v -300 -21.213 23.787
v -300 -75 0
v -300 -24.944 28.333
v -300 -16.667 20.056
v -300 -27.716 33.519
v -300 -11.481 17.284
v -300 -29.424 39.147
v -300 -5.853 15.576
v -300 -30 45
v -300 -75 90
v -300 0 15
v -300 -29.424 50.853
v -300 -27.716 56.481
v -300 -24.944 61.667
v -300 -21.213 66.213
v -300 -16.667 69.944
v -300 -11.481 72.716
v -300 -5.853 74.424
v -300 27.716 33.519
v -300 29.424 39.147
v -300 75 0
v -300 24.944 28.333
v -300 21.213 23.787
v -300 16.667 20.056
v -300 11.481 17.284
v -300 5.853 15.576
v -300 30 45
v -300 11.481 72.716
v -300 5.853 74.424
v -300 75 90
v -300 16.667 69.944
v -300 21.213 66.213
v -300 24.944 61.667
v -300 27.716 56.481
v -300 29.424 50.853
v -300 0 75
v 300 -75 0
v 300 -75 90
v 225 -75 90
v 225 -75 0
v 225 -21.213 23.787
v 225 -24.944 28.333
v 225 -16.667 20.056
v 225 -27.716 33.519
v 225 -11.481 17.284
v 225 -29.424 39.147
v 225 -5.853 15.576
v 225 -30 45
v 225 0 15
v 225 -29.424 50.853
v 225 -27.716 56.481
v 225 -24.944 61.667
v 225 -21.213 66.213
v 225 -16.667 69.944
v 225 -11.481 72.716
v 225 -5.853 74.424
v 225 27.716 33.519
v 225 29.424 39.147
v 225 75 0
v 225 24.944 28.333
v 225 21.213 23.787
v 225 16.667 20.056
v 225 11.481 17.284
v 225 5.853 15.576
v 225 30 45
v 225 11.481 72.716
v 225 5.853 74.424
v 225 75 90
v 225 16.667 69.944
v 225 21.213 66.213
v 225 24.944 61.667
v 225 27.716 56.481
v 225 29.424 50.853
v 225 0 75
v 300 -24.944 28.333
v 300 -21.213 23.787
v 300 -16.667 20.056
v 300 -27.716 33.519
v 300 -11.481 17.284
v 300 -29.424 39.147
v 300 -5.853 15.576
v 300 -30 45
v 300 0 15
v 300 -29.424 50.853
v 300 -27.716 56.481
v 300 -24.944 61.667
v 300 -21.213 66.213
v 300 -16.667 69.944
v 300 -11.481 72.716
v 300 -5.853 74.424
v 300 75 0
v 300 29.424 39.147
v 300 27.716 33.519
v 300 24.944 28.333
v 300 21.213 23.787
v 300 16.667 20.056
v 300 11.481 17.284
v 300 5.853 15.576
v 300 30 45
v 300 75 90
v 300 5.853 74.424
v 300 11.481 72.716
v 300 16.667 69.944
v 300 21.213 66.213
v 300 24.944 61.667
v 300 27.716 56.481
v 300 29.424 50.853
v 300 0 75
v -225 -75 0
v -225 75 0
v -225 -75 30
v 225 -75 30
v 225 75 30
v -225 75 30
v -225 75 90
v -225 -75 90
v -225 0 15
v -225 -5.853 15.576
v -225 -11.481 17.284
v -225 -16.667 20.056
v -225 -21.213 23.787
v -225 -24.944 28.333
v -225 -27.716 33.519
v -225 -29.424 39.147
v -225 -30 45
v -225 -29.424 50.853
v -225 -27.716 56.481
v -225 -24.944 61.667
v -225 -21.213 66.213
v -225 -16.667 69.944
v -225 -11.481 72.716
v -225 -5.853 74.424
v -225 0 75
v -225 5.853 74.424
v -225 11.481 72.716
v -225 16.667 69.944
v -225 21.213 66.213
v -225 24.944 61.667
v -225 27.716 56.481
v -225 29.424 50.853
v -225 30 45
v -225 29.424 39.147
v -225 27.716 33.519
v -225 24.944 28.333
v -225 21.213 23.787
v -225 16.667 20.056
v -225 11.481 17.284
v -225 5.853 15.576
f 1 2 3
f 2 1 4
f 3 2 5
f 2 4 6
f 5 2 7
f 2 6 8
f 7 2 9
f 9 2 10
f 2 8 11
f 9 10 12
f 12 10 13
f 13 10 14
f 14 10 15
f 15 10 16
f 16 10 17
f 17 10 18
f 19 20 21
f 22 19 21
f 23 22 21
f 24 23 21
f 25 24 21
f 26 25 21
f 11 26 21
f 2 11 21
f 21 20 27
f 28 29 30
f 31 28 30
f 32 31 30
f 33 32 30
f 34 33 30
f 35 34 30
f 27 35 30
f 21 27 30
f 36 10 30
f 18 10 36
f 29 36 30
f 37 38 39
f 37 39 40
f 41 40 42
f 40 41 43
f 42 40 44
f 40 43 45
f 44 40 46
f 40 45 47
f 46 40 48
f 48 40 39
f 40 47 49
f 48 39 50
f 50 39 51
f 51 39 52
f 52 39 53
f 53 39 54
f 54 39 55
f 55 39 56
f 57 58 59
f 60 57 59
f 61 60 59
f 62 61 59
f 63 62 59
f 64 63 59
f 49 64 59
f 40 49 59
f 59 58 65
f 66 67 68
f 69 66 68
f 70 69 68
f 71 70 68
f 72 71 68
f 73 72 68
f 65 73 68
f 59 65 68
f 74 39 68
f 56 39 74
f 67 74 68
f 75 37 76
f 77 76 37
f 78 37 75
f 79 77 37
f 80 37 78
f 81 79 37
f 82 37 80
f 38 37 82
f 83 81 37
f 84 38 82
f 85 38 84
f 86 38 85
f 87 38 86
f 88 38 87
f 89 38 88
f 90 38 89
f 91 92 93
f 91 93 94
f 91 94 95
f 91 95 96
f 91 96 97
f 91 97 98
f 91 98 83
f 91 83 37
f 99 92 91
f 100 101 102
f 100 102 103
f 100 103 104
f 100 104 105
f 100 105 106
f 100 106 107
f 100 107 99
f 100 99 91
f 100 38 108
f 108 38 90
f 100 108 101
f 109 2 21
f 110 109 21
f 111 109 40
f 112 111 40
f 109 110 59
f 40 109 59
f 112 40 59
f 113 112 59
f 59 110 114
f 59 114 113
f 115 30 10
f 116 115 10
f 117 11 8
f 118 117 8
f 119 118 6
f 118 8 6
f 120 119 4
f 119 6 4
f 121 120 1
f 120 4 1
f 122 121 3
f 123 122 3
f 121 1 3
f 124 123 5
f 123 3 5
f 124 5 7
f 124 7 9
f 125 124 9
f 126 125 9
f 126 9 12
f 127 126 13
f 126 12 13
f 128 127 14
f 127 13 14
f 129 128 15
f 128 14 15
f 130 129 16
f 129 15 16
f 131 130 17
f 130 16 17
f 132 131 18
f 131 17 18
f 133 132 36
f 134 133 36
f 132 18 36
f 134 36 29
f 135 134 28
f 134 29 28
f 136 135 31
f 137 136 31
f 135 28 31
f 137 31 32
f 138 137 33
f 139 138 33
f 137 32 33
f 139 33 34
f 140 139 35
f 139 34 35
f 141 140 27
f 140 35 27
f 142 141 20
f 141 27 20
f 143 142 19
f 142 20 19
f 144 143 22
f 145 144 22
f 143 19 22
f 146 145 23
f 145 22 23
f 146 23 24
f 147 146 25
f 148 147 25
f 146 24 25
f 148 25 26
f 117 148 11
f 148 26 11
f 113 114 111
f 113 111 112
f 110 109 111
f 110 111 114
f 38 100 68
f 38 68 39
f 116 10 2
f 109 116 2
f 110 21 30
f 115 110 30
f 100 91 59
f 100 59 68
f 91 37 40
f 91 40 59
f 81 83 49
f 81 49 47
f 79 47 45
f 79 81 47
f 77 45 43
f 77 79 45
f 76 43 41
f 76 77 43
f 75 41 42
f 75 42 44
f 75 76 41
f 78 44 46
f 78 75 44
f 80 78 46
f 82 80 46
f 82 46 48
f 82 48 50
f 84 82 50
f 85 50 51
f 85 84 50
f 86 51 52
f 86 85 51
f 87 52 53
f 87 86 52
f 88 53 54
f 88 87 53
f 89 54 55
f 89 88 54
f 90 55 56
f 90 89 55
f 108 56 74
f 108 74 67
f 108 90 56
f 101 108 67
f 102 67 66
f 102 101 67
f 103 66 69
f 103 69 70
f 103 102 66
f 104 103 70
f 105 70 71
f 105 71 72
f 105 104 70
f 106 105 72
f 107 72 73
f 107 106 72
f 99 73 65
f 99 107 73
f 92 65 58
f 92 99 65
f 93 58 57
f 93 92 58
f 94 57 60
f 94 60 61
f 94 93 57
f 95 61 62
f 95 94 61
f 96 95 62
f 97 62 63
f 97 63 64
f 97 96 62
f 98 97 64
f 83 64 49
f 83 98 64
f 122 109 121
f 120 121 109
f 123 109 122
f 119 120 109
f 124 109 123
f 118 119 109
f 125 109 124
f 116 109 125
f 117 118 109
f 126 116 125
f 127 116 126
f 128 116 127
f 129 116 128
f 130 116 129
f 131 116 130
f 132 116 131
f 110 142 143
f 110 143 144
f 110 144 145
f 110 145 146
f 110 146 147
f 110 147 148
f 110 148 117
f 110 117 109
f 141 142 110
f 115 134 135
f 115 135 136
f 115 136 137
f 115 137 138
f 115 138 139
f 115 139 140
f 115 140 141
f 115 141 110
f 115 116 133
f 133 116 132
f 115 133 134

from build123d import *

# Parameters (mm, degrees)
F4_DEPTH = 75
F7_DEPTH = 75
F0_W     = 450
F0_H     = 150
F8_DEPTH = 30


with BuildPart() as f4:
    # F3 (on offset) → F4 (new body)
    with BuildSketch(Plane.YZ.offset(300)):
        Polygon((-75, 0), (0, 0), (75, 0), (75, 90), (-75, 90), align=None)
        with BuildLine():
            ThreePointArc((30, 45), (21.2132034356, 23.7867965644), (0, 15))
            ThreePointArc((0, 15), (-21.2132034356, 66.2132034356), (30, 45))
        make_face(mode=Mode.SUBTRACT)
    extrude(amount=-F4_DEPTH)


with BuildPart() as f7:
    # F6 (on offset) → F7 (new body)
    with BuildSketch(Plane.YZ.offset(-300)):
        Polygon((-75, 0), (0, 0), (75, 0), (75, 90), (-75, 90), align=None)
        with BuildLine():
            ThreePointArc((30, 45), (21.2132034356, 23.7867965644), (0, 15))
            ThreePointArc((0, 15), (-21.2132034356, 66.2132034356), (30, 45))
        make_face(mode=Mode.SUBTRACT)
    extrude(amount=F7_DEPTH)


with BuildPart() as f8:
    # F0 (on Top) → F8 (new body)
    with BuildSketch(Plane.XY):
        Rectangle(F0_W, F0_H)
    extrude(amount=F8_DEPTH)


solid = Compound([f4.part, f7.part, f8.part])
